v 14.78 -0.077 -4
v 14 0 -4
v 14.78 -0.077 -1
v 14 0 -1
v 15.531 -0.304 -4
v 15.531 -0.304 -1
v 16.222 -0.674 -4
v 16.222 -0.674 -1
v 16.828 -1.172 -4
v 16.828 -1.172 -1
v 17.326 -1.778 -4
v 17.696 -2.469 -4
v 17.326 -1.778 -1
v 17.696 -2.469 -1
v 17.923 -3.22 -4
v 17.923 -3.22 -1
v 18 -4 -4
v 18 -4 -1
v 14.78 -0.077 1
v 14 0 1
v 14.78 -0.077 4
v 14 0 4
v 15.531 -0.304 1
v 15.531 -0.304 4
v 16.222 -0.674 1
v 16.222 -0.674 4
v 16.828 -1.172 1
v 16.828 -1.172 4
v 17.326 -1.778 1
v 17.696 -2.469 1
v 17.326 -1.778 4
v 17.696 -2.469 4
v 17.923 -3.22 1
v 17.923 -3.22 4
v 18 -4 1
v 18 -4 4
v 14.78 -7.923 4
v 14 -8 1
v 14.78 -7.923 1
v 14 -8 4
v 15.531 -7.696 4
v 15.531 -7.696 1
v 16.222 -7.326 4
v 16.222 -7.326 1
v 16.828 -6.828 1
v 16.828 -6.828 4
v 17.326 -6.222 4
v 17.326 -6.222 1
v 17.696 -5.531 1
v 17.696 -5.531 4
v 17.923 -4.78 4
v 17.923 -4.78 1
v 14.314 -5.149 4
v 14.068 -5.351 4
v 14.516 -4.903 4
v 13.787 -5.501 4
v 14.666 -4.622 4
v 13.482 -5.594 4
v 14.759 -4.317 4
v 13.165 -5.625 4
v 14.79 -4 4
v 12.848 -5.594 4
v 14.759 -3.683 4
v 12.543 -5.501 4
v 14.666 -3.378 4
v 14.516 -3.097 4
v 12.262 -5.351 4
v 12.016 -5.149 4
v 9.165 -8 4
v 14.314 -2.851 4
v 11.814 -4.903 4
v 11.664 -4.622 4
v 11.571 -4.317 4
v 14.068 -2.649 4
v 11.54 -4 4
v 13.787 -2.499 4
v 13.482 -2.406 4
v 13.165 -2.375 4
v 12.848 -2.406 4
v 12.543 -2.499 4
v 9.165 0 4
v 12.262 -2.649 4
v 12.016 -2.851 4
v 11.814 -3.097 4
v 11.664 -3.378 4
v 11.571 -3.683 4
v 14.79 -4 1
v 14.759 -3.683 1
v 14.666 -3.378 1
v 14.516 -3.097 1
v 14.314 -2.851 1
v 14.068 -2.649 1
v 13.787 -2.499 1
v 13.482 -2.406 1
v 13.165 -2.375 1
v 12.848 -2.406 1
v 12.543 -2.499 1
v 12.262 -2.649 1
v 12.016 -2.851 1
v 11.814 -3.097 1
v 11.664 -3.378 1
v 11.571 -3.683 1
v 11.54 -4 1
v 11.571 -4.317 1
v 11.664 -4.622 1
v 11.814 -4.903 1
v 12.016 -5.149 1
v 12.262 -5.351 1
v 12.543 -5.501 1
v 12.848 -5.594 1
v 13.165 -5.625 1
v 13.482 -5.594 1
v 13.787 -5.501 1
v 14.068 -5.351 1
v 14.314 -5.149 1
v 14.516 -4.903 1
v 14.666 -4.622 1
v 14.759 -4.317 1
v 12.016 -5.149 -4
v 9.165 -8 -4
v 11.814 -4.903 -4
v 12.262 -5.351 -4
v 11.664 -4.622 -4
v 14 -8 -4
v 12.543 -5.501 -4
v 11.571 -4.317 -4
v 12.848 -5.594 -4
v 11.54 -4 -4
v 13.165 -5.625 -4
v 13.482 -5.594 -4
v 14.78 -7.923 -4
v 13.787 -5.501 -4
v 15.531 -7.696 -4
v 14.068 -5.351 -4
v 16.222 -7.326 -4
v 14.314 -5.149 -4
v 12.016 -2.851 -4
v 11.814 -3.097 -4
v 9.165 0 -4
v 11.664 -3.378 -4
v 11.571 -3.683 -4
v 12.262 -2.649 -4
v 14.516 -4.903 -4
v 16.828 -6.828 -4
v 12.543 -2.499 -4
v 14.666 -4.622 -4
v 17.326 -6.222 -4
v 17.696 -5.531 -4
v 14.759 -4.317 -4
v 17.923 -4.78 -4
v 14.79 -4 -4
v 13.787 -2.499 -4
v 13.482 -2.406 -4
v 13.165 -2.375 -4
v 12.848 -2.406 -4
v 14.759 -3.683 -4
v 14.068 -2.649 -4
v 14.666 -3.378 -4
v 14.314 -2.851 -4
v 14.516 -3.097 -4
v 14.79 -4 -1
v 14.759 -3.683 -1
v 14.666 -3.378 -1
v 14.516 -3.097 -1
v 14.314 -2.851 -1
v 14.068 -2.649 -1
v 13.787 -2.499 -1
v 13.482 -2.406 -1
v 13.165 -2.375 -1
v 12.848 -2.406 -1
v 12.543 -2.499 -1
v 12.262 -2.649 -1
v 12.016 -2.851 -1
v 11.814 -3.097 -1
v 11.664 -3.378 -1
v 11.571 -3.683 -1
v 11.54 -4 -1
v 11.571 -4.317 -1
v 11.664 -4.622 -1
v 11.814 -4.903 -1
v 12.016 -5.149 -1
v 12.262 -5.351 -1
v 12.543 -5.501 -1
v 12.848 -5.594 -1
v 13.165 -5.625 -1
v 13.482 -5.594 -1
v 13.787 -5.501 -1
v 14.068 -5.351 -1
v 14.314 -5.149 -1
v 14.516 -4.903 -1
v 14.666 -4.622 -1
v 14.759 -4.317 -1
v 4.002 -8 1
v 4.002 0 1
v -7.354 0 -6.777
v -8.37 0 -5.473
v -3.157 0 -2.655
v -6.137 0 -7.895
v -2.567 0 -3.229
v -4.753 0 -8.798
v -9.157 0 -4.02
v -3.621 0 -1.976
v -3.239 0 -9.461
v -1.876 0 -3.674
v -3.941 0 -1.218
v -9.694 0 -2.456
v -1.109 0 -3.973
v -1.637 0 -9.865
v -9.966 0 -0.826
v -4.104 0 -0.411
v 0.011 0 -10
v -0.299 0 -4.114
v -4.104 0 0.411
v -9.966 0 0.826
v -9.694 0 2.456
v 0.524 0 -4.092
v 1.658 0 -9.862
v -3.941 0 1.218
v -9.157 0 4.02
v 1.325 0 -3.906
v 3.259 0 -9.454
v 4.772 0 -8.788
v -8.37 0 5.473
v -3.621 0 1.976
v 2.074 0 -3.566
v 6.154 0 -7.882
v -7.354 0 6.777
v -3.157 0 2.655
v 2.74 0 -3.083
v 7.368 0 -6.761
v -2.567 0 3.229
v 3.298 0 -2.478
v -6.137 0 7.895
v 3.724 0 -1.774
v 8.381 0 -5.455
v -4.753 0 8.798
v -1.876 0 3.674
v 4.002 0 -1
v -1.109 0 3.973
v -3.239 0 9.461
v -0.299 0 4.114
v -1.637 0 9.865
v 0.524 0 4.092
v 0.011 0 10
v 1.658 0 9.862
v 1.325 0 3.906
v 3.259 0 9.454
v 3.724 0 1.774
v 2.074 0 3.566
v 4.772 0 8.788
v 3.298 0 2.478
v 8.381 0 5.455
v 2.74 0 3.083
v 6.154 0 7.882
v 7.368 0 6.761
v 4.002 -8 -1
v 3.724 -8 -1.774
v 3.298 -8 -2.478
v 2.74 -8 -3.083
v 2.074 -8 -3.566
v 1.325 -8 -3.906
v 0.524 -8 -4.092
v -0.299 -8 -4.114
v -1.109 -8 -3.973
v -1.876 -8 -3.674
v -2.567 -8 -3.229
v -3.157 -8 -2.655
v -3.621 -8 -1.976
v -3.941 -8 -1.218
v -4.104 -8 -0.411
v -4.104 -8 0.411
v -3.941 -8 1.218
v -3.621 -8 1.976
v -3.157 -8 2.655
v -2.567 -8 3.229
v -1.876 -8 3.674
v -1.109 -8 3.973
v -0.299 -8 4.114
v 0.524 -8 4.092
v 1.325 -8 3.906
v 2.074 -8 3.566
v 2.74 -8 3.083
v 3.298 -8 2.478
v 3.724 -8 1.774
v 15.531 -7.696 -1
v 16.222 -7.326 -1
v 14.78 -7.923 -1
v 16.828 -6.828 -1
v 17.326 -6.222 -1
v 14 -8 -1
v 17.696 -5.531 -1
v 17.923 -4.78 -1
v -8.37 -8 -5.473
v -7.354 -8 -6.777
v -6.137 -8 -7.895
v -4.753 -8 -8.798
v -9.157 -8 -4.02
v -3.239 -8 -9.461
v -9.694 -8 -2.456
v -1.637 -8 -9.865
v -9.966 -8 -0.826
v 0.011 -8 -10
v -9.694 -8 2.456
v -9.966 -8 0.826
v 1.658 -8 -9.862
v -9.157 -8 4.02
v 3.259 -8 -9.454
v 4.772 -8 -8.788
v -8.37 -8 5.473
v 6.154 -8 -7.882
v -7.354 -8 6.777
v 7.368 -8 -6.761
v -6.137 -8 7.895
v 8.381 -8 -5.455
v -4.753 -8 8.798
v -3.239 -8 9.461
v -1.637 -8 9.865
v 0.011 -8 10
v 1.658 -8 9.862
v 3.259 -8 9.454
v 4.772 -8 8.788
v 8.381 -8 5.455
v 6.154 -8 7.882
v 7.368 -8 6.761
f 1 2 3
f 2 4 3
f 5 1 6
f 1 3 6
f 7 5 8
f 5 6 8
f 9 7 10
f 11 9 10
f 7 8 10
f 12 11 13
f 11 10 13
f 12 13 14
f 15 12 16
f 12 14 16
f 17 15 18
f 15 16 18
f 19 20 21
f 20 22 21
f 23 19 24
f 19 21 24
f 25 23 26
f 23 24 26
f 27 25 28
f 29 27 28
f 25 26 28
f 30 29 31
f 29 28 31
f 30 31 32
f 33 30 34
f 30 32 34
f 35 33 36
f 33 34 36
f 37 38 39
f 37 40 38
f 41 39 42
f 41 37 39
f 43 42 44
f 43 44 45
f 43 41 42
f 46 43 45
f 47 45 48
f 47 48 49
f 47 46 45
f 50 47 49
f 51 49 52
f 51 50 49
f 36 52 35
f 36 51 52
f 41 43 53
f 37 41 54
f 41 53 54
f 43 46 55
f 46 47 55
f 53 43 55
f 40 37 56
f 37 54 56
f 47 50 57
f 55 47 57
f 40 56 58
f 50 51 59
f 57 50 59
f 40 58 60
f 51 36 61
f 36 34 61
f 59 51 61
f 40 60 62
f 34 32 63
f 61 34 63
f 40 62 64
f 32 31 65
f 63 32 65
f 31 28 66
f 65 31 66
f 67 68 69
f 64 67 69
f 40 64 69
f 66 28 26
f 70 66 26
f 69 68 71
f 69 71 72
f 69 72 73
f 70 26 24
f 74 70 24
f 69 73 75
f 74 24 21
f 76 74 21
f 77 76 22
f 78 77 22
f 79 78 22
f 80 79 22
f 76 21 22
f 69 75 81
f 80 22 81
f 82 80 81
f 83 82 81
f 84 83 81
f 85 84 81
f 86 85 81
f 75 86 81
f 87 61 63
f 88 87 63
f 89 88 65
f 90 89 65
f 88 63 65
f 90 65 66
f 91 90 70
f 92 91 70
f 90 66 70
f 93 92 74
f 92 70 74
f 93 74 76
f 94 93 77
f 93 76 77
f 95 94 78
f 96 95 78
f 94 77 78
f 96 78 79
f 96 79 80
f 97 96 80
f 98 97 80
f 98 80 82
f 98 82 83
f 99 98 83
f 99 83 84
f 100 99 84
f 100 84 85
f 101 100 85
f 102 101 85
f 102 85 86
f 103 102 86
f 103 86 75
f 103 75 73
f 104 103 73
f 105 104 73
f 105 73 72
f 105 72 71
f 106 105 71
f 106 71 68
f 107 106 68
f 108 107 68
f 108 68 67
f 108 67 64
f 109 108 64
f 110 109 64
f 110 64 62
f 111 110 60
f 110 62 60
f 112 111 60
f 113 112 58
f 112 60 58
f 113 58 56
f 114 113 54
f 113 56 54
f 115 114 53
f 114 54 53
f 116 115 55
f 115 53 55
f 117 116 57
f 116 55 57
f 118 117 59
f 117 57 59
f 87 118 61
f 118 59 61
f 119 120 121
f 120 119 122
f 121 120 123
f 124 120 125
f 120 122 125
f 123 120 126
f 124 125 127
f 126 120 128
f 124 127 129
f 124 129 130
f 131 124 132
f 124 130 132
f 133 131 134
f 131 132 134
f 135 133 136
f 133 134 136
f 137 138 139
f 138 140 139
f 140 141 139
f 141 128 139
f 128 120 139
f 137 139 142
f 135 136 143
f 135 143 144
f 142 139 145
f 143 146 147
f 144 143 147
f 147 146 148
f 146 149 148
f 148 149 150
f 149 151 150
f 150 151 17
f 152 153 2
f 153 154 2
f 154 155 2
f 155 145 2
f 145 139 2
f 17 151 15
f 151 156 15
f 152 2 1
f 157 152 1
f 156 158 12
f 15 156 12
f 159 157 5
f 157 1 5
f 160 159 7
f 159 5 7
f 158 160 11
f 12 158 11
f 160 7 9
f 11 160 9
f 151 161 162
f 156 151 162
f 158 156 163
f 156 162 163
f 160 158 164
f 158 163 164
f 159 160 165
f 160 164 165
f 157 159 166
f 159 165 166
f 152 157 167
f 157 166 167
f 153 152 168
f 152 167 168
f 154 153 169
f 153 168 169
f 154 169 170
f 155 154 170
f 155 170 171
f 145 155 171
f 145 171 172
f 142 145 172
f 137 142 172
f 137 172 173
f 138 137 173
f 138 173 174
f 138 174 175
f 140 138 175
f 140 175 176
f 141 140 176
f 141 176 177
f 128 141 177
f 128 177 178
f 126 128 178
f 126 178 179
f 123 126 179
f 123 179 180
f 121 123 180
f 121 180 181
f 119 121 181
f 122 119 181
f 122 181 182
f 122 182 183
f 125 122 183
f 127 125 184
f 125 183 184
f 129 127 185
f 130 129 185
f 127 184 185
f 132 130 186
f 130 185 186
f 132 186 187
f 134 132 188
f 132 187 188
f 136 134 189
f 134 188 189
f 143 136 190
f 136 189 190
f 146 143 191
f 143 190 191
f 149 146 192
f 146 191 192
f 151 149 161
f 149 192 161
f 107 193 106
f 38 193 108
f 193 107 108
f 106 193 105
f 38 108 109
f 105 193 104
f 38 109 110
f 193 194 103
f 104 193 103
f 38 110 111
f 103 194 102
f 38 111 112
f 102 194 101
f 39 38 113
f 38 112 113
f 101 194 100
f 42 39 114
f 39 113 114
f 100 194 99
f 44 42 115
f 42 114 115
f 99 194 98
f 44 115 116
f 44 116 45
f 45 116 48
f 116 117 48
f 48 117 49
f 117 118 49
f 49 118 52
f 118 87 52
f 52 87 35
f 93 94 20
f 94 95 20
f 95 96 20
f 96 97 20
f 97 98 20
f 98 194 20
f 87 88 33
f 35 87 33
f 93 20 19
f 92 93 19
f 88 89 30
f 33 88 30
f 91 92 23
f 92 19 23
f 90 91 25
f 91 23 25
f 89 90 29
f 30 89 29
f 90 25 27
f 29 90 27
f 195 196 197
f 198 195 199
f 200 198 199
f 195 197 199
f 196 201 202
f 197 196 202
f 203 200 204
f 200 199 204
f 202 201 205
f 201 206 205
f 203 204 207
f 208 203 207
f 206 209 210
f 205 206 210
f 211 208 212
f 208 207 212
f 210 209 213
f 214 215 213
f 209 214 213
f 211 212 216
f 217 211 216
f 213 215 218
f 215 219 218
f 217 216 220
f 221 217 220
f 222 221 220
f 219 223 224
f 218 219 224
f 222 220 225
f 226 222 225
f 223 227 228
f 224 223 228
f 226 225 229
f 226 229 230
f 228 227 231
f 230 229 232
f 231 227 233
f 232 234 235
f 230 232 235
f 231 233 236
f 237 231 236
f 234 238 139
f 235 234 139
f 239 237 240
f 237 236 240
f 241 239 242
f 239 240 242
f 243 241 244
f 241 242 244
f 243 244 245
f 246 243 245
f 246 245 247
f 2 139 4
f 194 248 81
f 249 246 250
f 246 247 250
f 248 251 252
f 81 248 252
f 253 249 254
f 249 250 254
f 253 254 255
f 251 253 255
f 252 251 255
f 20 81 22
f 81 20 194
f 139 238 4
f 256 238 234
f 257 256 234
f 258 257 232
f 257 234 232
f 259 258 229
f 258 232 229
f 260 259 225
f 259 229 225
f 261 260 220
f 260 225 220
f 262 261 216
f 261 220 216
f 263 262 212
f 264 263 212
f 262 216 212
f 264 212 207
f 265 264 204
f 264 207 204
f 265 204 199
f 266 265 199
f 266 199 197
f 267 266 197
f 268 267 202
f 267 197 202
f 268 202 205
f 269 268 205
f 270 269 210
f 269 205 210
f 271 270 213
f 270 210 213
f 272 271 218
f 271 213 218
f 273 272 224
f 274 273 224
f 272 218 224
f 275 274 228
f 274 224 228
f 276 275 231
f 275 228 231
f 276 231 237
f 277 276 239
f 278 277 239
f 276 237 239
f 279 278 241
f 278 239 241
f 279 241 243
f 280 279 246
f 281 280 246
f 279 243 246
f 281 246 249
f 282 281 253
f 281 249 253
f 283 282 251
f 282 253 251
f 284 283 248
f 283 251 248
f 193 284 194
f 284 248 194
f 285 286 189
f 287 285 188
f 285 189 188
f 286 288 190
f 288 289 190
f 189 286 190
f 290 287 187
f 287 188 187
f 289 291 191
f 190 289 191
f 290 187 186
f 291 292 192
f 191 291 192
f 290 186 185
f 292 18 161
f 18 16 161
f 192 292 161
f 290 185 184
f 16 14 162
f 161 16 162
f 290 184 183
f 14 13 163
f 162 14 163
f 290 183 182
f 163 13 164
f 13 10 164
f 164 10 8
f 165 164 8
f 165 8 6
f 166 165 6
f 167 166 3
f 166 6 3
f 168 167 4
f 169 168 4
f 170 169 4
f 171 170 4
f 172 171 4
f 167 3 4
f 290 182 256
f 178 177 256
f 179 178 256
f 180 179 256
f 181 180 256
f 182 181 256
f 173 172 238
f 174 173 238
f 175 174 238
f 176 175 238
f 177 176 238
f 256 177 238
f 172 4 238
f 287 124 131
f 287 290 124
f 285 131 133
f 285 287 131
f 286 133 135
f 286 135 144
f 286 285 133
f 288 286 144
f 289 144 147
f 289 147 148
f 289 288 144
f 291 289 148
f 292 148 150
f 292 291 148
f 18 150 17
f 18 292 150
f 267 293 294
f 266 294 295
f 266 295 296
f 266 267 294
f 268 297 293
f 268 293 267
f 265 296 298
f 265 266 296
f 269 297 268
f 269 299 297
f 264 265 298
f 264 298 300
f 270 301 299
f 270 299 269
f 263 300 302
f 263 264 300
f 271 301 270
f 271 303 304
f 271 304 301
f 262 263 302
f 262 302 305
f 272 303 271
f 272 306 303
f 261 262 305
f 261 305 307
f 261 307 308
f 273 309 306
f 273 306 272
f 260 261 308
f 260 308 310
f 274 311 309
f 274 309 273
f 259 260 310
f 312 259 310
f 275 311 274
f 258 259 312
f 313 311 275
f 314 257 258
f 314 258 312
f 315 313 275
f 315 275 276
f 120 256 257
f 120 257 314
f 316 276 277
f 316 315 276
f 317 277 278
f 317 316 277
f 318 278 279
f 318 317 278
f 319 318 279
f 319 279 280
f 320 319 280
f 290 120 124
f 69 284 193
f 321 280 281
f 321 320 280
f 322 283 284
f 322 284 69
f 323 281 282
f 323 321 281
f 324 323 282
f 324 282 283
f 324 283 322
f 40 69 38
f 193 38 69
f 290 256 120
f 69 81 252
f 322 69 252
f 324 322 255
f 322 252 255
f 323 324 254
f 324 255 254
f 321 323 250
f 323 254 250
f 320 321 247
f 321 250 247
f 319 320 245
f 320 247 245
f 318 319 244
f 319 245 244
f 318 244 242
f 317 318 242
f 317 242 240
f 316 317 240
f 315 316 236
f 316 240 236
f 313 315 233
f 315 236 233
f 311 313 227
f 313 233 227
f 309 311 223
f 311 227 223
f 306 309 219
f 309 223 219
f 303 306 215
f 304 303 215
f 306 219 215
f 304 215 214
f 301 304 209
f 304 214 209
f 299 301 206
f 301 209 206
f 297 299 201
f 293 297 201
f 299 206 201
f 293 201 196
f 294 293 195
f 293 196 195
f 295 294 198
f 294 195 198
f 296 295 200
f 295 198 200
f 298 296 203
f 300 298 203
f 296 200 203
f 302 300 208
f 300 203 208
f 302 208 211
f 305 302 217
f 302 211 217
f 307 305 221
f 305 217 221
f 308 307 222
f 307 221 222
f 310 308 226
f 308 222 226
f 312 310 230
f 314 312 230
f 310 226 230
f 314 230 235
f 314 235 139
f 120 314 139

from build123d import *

# Parameters (mm, degrees)
F1_DEPTH = 8
F2_R     = 1.625
F3_DEPTH = 14.001
F4_R     = 3.99999


# Not quite as in the source:
# - a fillet or chamfer is up to 0.001 mm smaller than in the source, because OpenCascade refuses the exact size


with BuildPart() as f1:
    # F0 (on Front) → F1 (new body)
    with BuildSketch(Plane.XZ):
        with BuildLine():
            ThreePointArc((4.0019526484, -1), (-4.125, 0), (4.0019526484, 1))
            Line((4.0019526484, 1), (18, 1))
            Line((18, 1), (18, 4))
            Line((18, 4), (9.1651513899, 4))
            ThreePointArc((9.1651513899, 4), (-10, 0), (9.1651513899, -4))
            Line((9.1651513899, -4), (18, -4))
            Line((18, -4), (18, -1))
            Line((18, -1), (4.0019526484, -1))
        make_face()
    extrude(amount=F1_DEPTH)

    # F2 (on face) → F3 (cut, through all)
    with BuildSketch(Plane.XY.offset(4)):
        with Locations((13.1651513899, -4.0000034496)):
            Circle(F2_R)
    extrude(amount=-F3_DEPTH, mode=Mode.SUBTRACT)

    # F4 (radius 4 in the source; OpenCascade refuses exactly that, so slightly less here)
    f4_edges = [f1.edges().sort_by_distance(p)[0] for p in [
        (18, -8, 2.5),
        (18, -8, -2.5),
        (18, 0, -2.5),
        (18, 0, 2.5),
    ]]
    fillet(f4_edges, radius=F4_R)


solid = f1.part
